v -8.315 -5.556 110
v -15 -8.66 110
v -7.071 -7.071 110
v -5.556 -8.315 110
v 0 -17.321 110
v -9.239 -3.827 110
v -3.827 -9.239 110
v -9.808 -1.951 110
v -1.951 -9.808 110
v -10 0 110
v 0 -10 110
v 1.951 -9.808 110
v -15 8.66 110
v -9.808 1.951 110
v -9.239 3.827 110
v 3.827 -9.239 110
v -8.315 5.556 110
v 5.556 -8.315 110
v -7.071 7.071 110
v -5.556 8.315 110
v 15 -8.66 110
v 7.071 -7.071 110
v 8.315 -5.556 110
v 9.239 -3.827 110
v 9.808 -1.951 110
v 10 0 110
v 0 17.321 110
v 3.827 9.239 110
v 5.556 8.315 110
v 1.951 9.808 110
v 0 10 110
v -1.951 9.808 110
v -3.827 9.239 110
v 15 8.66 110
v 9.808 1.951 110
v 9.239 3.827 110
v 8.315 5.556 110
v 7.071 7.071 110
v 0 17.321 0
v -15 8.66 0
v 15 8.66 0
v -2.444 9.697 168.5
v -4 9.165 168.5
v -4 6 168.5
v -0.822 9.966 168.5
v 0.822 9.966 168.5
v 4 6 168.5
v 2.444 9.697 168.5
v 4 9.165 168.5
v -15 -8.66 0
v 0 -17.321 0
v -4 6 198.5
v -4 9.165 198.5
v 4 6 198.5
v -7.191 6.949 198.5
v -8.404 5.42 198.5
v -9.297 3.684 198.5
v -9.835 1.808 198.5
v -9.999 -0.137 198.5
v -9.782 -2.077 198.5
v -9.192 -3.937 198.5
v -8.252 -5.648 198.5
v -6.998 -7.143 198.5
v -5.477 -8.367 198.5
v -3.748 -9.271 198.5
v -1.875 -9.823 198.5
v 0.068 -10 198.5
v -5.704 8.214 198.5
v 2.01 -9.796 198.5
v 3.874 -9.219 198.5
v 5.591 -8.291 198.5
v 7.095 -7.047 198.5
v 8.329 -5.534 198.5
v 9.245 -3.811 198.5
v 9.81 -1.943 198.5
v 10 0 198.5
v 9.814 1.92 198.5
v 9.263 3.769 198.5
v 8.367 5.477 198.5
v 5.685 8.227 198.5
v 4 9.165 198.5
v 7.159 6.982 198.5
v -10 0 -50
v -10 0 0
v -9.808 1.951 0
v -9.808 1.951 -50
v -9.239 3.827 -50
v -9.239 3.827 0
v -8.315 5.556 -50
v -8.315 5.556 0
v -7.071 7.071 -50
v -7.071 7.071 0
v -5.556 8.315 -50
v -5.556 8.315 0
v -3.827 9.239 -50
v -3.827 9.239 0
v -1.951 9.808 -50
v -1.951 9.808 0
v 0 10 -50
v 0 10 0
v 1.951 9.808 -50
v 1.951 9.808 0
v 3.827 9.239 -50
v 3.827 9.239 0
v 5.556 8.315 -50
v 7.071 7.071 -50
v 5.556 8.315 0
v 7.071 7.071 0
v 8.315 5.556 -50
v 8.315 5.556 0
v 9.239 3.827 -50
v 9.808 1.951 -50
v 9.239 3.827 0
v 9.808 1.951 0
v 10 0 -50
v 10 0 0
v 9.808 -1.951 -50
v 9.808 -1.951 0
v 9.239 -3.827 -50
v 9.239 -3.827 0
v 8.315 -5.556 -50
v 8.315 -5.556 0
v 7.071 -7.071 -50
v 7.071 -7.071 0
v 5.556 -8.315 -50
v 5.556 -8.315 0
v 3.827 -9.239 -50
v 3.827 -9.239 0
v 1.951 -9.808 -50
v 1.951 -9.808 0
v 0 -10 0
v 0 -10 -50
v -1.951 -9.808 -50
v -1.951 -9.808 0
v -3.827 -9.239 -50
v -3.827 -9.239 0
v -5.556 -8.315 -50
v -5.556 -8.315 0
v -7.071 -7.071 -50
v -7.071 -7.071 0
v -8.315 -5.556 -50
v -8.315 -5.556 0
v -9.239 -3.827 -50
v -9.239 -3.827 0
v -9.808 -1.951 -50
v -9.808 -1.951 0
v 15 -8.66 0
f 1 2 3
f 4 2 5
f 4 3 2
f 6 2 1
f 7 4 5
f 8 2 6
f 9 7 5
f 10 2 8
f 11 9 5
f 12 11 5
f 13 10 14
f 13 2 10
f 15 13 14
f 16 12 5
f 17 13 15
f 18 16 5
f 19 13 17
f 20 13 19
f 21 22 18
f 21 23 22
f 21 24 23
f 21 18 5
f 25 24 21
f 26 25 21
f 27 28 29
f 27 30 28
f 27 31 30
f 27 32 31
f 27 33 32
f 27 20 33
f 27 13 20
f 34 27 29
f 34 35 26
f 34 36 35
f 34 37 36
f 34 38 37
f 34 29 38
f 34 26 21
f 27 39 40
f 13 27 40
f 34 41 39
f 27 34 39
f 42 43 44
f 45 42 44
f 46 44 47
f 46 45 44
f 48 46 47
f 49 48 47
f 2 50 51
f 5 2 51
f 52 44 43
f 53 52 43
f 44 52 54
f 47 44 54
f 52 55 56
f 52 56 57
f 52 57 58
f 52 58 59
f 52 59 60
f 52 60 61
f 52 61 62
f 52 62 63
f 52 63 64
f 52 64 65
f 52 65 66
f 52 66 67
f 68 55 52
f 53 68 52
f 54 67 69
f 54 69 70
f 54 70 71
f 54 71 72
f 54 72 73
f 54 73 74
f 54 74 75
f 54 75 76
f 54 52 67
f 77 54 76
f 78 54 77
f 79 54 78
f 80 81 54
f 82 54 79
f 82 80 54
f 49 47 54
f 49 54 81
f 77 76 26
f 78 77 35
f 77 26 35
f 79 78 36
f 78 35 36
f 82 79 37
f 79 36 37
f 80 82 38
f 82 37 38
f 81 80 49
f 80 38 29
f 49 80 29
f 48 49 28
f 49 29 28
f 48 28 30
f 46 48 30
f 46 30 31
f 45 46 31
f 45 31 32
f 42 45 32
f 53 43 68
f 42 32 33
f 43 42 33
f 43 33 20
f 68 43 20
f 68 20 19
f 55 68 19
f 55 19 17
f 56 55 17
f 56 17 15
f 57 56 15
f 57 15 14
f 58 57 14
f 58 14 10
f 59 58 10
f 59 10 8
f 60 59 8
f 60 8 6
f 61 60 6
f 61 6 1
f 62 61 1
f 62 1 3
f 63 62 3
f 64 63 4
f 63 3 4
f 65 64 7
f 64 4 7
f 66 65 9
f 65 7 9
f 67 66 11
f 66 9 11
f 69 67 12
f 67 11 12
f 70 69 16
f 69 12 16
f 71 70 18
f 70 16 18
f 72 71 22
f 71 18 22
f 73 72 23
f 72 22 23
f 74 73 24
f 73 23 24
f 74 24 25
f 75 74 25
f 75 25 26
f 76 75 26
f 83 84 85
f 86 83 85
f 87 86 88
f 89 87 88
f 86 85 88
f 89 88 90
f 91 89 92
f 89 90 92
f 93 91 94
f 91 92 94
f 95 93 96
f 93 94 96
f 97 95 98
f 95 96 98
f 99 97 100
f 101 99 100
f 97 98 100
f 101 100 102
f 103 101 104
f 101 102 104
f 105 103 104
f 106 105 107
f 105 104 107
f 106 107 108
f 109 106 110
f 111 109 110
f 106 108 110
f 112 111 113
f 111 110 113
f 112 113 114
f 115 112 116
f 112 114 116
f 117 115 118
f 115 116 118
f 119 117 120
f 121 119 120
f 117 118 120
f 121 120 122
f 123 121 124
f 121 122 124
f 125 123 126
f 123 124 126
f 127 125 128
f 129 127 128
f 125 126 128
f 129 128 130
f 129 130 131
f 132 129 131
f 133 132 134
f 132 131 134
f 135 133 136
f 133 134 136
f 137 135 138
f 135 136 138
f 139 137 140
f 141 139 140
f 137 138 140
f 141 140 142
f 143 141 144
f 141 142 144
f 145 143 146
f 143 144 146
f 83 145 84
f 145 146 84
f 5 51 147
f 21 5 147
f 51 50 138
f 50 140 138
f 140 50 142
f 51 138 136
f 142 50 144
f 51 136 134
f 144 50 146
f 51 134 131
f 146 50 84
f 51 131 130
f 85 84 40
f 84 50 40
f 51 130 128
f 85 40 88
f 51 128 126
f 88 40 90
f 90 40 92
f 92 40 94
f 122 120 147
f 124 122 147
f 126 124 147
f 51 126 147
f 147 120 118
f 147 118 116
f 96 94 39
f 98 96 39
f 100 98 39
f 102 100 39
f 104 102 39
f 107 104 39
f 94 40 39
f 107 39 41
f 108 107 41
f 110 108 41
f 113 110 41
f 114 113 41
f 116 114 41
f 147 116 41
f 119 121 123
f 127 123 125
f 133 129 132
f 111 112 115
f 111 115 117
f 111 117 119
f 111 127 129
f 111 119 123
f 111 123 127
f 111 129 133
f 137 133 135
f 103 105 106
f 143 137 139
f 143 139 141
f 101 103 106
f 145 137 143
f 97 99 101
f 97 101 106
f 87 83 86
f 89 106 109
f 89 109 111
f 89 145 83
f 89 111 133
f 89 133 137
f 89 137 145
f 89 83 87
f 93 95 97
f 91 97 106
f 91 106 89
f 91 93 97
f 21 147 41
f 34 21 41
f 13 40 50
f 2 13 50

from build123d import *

# Parameters (mm, degrees)
RESSALTO_EXTRUS_O1_DEPTH = 110
ESBO_O2_R                = 10
RESSALTO_EXTRUS_O2_DEPTH = 88.5
ESBO_O3_R                = 10
RESSALTO_EXTRUS_O3_DEPTH = 50
ESBO_O5_W                = 8
ESBO_O5_H                = 8
CORTE_EXTRUS_O1_DEPTH    = 30


with BuildPart() as part:
    # Esboço1 → Ressalto-extrusão1 (new body)
    with BuildSketch(Plane.XY):
        Polygon((-15, 8.660254038), (-15, -8.660254038), (0, -17.320508076), (15, -8.660254038), (15, 8.660254038), (0, 17.320508076), align=None)
    extrude(amount=RESSALTO_EXTRUS_O1_DEPTH)

    # Esboço2 → Ressalto-extrusão2 (add)
    with BuildSketch(Plane.XY.offset(110)):
        Circle(ESBO_O2_R)
    extrude(amount=RESSALTO_EXTRUS_O2_DEPTH)

    # Esboço3 → Ressalto-extrusão3 (add)
    with BuildSketch(Plane(origin=(0, 0, 0), x_dir=(-1, 0, 0), z_dir=(0, 0, -1))):
        Circle(ESBO_O3_R)
    extrude(amount=RESSALTO_EXTRUS_O3_DEPTH)

    # Esboço5 → Corte-extrusão1 (cut)
    with BuildSketch(Plane.XY.offset(198.5)):
        with Locations((0, 10)):
            Rectangle(ESBO_O5_W, ESBO_O5_H)
    extrude(amount=-CORTE_EXTRUS_O1_DEPTH, mode=Mode.SUBTRACT)


solid = part.part
